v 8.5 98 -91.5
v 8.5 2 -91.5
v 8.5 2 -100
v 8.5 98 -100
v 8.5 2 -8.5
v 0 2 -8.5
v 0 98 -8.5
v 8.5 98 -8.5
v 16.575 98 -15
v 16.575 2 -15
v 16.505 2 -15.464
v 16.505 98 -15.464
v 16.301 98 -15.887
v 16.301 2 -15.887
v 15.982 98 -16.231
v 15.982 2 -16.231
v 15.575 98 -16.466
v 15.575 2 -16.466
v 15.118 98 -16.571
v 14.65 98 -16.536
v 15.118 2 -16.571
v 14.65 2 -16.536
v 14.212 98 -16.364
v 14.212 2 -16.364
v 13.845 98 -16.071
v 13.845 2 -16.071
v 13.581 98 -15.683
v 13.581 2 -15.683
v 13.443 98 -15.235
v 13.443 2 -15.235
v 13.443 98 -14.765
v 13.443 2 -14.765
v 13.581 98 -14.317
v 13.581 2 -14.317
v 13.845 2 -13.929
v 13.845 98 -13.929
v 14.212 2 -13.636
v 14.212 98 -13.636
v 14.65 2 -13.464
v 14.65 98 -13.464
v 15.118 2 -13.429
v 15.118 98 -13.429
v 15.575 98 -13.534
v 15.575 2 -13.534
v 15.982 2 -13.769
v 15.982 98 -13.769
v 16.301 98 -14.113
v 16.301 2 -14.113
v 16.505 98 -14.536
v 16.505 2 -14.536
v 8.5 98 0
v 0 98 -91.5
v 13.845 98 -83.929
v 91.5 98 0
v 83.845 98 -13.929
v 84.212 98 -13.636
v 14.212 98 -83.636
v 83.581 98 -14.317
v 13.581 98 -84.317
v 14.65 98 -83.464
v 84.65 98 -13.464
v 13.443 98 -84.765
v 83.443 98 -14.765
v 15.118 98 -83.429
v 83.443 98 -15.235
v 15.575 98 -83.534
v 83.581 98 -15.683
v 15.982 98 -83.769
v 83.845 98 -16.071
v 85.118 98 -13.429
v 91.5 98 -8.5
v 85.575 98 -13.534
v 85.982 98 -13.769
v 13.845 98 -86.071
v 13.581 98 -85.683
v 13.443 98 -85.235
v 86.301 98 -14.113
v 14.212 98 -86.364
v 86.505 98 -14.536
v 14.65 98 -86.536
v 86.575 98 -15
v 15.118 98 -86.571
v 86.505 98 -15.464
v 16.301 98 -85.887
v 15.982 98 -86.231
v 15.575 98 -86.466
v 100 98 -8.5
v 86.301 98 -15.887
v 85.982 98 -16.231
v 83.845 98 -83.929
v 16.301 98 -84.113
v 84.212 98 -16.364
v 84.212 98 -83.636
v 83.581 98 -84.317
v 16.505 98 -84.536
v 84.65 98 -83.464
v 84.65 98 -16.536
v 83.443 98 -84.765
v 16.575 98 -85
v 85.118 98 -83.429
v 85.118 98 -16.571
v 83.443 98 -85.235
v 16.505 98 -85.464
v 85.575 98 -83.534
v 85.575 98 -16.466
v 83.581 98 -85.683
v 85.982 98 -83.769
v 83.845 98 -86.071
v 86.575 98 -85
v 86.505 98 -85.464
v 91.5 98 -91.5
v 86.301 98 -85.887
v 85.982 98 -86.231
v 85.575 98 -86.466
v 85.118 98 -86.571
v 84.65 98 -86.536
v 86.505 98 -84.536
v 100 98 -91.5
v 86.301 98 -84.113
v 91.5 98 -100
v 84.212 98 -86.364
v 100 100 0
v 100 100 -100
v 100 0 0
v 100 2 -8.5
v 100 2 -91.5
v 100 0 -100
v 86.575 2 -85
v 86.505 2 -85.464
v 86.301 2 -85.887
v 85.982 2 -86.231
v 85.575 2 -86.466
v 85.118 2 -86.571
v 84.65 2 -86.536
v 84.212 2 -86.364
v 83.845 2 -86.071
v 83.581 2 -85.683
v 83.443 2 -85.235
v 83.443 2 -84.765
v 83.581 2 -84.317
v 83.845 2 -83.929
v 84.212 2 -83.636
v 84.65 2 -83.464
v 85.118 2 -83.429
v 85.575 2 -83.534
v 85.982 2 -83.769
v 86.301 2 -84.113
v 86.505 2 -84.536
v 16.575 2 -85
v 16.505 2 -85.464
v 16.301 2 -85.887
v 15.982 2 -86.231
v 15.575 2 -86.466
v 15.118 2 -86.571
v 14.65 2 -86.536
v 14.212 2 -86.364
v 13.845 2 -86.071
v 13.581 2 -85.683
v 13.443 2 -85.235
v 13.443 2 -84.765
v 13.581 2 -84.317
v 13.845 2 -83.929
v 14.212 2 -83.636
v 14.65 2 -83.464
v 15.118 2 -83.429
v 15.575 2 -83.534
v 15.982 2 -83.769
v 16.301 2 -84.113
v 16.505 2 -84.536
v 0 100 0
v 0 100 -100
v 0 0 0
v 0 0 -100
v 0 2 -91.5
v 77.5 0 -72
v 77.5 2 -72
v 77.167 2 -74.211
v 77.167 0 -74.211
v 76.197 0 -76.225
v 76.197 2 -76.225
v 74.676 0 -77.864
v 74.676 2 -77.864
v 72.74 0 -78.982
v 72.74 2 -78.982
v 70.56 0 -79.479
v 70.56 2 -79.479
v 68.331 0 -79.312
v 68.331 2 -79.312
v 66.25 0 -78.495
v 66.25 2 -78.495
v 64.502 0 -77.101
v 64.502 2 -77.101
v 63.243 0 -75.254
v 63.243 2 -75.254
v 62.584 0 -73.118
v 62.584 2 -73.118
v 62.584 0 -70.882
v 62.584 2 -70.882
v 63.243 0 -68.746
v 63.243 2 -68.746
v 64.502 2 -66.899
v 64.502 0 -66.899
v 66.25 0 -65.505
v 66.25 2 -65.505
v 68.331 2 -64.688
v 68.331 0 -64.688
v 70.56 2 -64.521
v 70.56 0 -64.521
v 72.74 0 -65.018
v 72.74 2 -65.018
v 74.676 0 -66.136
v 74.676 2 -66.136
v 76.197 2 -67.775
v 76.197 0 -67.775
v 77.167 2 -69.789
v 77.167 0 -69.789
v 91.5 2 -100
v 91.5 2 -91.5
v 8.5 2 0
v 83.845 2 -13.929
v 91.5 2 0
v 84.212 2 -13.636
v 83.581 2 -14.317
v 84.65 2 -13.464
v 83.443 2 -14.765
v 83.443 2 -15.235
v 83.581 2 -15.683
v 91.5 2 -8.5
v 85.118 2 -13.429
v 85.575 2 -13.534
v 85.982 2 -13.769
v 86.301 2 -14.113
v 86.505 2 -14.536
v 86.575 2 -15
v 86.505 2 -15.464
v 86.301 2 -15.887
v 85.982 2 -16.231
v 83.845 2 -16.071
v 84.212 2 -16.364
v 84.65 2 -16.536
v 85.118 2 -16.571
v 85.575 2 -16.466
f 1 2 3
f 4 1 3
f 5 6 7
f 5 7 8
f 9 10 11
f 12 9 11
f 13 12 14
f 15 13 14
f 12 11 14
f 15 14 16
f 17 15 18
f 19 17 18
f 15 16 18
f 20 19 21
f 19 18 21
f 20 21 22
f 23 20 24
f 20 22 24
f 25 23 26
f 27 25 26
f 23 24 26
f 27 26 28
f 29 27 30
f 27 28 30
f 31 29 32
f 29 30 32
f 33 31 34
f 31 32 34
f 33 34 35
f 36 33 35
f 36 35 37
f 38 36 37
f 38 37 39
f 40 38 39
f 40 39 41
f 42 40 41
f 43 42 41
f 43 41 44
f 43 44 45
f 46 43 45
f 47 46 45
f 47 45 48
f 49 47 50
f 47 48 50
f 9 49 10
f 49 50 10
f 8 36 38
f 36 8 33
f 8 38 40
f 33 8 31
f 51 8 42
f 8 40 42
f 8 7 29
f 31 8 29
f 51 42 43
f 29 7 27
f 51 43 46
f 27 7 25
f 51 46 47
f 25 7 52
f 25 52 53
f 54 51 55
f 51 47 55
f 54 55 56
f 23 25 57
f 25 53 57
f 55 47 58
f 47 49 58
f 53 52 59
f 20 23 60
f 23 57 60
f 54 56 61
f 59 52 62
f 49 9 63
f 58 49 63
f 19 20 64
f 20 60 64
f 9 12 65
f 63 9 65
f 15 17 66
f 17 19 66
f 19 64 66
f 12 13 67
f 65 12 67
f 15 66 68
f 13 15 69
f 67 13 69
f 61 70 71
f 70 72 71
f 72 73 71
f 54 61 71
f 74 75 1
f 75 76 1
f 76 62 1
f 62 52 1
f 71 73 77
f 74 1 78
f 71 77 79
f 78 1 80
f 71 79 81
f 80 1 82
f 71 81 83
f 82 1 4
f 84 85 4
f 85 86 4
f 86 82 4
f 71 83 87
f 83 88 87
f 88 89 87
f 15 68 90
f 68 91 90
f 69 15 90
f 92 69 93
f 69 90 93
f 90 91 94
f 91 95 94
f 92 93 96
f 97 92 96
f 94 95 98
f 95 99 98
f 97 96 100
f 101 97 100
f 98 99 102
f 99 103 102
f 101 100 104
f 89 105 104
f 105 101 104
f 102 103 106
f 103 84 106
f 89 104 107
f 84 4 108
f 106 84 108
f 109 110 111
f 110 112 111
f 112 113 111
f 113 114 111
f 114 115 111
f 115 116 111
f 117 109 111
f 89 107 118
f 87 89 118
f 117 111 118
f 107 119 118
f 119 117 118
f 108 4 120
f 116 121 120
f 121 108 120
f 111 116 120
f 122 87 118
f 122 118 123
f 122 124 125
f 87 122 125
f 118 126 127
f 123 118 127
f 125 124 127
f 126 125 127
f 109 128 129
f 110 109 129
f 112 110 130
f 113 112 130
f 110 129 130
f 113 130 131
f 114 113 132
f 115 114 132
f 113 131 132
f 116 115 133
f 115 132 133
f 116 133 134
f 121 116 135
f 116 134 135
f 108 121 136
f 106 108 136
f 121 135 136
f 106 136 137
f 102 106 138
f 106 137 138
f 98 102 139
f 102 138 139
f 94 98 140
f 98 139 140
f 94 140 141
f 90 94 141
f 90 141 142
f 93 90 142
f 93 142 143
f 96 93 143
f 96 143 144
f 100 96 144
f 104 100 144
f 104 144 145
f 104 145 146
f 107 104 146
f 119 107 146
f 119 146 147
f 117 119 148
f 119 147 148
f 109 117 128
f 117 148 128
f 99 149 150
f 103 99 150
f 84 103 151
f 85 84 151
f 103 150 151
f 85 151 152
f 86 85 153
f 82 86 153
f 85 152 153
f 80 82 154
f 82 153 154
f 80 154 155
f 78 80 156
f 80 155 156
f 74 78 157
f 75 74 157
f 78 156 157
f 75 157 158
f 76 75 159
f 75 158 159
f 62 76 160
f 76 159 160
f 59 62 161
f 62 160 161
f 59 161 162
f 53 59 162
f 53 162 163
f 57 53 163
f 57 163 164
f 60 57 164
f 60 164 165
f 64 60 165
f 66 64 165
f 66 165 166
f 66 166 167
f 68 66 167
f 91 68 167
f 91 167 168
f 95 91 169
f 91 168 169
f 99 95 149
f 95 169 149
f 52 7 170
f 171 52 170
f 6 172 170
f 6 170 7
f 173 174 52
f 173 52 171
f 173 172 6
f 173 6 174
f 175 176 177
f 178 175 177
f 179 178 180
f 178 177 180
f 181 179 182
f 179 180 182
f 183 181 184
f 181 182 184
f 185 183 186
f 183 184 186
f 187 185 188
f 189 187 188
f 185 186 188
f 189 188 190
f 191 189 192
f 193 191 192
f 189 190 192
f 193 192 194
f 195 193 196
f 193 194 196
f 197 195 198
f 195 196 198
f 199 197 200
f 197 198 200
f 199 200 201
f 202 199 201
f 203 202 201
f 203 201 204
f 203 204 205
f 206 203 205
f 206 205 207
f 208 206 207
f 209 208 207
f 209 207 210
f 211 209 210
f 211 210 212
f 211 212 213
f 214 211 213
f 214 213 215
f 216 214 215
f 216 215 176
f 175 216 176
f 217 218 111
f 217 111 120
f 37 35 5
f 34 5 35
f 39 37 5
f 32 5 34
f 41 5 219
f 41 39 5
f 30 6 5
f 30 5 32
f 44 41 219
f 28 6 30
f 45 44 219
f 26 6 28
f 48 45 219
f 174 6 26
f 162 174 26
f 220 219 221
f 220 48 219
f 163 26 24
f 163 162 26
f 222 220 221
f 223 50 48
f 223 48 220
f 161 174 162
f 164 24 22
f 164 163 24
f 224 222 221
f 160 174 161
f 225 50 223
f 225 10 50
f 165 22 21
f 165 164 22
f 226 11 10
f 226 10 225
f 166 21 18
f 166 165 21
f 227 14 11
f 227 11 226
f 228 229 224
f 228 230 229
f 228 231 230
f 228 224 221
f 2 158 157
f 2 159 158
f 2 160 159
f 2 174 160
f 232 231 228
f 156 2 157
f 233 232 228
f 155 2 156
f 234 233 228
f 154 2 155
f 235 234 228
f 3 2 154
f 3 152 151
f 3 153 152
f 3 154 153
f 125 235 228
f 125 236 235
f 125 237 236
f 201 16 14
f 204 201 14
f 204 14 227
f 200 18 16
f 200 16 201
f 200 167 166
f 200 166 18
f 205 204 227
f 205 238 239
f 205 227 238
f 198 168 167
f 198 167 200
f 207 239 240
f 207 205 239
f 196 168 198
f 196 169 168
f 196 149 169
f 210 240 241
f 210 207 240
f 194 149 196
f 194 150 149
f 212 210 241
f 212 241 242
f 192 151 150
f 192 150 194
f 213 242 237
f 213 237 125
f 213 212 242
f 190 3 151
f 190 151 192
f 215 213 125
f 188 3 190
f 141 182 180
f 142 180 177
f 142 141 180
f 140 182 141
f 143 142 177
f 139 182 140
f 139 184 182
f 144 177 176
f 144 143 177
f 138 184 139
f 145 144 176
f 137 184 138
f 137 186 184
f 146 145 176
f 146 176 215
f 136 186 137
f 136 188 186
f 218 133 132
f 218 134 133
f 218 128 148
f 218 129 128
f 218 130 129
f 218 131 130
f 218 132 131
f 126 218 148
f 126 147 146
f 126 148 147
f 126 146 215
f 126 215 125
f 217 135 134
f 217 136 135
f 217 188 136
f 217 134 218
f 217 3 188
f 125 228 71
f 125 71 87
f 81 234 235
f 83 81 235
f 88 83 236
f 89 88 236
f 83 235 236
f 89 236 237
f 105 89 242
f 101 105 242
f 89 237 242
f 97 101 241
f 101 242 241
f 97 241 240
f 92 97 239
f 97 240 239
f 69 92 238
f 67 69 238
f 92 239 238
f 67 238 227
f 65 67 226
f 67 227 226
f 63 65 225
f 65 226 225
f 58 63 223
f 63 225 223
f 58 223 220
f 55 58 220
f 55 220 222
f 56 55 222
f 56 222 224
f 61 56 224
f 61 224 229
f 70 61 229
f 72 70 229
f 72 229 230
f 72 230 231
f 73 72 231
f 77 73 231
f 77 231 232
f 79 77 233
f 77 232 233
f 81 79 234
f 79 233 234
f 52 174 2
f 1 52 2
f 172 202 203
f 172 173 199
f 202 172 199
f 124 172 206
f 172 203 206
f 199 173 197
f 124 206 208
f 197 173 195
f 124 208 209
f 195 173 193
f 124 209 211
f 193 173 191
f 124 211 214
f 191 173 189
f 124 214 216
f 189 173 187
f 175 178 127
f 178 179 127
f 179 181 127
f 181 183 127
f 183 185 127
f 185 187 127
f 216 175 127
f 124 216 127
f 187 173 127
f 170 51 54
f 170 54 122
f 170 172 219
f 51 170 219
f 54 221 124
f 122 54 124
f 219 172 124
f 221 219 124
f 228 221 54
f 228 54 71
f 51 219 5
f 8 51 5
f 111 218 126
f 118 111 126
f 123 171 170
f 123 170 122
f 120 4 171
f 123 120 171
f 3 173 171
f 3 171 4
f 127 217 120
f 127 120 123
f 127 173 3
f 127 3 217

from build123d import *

# Parameters (mm, degrees)
SKETCH1_W            = 100
SKETCH1_H            = 100
BASE_DEPTH           = 2
SKETCH2_W            = 8.5
SKETCH2_H            = 8.5
BOSS_EXTRUDE2_DEPTH  = 96
LPATTERN1_COUNT      = 2
LPATTERN1_PITCH      = 91.5
LPATTERN1_COUNT_DIR2 = 2
LPATTERN1_PITCH_DIR2 = 91.5
LPATTERN2_COUNT      = 2
LPATTERN2_PITCH      = 98
SKETCH3_R            = 1.575
RODS_DEPTH           = 96
LPATTERN3_COUNT      = 2
LPATTERN3_PITCH      = 70
LPATTERN3_COUNT_DIR2 = 2
LPATTERN3_PITCH_DIR2 = 70
SKETCH5_R            = 7.5
CUT_EXTRUDE1_DEPTH   = 10


with BuildPart() as part:
    # Sketch1 → Base (new body)
    with BuildSketch(Plane(origin=(0, 0, 0), x_dir=(1, 0, 0), z_dir=(0, 1, 0))):
        with Locations((50, 50)):
            Rectangle(SKETCH1_W, SKETCH1_H)
    base = extrude(amount=BASE_DEPTH)

    # Sketch2 → Boss-Extrude2 (add)
    with BuildSketch(Plane(origin=(0, 2, 0), x_dir=(1, 0, 0), z_dir=(0, 1, 0))):
        with Locations((4.25, 4.25)):
            Rectangle(SKETCH2_W, SKETCH2_H)
    boss_extrude2 = extrude(amount=BOSS_EXTRUDE2_DEPTH)

    # LPattern1: Boss-Extrude2 2 × 2
    with Locations(*[(j * LPATTERN1_PITCH_DIR2, 0, -i * LPATTERN1_PITCH) for i in range(LPATTERN1_COUNT) for j in range(LPATTERN1_COUNT_DIR2) if (i, j) != (0, 0)]):
        add(boss_extrude2)

    # LPattern2: Base ×2
    with Locations(*[(0, i * LPATTERN2_PITCH, 0) for i in range(1, LPATTERN2_COUNT)]):
        add(base)

    # Sketch3 → Rods (add)
    with BuildSketch(Plane(origin=(0, 2, 0), x_dir=(1, 0, 0), z_dir=(0, 1, 0))):
        with Locations((15, 85)):
            Circle(SKETCH3_R)
    rods = extrude(amount=RODS_DEPTH)

    # LPattern3: Rods 2 × 2
    with Locations(*[(i * LPATTERN3_PITCH, 0, j * LPATTERN3_PITCH_DIR2) for i in range(LPATTERN3_COUNT) for j in range(LPATTERN3_COUNT_DIR2) if (i, j) != (0, 0)]):
        add(rods)

    # Sketch5 → Cut-Extrude1 (cut)
    with BuildSketch(Plane(origin=(0, 2, 0), x_dir=(1, 0, 0), z_dir=(0, 1, 0))):
        with Locations((70, 72)):
            Circle(SKETCH5_R)
    extrude(amount=-CUT_EXTRUDE1_DEPTH, mode=Mode.SUBTRACT)


solid = part.part
